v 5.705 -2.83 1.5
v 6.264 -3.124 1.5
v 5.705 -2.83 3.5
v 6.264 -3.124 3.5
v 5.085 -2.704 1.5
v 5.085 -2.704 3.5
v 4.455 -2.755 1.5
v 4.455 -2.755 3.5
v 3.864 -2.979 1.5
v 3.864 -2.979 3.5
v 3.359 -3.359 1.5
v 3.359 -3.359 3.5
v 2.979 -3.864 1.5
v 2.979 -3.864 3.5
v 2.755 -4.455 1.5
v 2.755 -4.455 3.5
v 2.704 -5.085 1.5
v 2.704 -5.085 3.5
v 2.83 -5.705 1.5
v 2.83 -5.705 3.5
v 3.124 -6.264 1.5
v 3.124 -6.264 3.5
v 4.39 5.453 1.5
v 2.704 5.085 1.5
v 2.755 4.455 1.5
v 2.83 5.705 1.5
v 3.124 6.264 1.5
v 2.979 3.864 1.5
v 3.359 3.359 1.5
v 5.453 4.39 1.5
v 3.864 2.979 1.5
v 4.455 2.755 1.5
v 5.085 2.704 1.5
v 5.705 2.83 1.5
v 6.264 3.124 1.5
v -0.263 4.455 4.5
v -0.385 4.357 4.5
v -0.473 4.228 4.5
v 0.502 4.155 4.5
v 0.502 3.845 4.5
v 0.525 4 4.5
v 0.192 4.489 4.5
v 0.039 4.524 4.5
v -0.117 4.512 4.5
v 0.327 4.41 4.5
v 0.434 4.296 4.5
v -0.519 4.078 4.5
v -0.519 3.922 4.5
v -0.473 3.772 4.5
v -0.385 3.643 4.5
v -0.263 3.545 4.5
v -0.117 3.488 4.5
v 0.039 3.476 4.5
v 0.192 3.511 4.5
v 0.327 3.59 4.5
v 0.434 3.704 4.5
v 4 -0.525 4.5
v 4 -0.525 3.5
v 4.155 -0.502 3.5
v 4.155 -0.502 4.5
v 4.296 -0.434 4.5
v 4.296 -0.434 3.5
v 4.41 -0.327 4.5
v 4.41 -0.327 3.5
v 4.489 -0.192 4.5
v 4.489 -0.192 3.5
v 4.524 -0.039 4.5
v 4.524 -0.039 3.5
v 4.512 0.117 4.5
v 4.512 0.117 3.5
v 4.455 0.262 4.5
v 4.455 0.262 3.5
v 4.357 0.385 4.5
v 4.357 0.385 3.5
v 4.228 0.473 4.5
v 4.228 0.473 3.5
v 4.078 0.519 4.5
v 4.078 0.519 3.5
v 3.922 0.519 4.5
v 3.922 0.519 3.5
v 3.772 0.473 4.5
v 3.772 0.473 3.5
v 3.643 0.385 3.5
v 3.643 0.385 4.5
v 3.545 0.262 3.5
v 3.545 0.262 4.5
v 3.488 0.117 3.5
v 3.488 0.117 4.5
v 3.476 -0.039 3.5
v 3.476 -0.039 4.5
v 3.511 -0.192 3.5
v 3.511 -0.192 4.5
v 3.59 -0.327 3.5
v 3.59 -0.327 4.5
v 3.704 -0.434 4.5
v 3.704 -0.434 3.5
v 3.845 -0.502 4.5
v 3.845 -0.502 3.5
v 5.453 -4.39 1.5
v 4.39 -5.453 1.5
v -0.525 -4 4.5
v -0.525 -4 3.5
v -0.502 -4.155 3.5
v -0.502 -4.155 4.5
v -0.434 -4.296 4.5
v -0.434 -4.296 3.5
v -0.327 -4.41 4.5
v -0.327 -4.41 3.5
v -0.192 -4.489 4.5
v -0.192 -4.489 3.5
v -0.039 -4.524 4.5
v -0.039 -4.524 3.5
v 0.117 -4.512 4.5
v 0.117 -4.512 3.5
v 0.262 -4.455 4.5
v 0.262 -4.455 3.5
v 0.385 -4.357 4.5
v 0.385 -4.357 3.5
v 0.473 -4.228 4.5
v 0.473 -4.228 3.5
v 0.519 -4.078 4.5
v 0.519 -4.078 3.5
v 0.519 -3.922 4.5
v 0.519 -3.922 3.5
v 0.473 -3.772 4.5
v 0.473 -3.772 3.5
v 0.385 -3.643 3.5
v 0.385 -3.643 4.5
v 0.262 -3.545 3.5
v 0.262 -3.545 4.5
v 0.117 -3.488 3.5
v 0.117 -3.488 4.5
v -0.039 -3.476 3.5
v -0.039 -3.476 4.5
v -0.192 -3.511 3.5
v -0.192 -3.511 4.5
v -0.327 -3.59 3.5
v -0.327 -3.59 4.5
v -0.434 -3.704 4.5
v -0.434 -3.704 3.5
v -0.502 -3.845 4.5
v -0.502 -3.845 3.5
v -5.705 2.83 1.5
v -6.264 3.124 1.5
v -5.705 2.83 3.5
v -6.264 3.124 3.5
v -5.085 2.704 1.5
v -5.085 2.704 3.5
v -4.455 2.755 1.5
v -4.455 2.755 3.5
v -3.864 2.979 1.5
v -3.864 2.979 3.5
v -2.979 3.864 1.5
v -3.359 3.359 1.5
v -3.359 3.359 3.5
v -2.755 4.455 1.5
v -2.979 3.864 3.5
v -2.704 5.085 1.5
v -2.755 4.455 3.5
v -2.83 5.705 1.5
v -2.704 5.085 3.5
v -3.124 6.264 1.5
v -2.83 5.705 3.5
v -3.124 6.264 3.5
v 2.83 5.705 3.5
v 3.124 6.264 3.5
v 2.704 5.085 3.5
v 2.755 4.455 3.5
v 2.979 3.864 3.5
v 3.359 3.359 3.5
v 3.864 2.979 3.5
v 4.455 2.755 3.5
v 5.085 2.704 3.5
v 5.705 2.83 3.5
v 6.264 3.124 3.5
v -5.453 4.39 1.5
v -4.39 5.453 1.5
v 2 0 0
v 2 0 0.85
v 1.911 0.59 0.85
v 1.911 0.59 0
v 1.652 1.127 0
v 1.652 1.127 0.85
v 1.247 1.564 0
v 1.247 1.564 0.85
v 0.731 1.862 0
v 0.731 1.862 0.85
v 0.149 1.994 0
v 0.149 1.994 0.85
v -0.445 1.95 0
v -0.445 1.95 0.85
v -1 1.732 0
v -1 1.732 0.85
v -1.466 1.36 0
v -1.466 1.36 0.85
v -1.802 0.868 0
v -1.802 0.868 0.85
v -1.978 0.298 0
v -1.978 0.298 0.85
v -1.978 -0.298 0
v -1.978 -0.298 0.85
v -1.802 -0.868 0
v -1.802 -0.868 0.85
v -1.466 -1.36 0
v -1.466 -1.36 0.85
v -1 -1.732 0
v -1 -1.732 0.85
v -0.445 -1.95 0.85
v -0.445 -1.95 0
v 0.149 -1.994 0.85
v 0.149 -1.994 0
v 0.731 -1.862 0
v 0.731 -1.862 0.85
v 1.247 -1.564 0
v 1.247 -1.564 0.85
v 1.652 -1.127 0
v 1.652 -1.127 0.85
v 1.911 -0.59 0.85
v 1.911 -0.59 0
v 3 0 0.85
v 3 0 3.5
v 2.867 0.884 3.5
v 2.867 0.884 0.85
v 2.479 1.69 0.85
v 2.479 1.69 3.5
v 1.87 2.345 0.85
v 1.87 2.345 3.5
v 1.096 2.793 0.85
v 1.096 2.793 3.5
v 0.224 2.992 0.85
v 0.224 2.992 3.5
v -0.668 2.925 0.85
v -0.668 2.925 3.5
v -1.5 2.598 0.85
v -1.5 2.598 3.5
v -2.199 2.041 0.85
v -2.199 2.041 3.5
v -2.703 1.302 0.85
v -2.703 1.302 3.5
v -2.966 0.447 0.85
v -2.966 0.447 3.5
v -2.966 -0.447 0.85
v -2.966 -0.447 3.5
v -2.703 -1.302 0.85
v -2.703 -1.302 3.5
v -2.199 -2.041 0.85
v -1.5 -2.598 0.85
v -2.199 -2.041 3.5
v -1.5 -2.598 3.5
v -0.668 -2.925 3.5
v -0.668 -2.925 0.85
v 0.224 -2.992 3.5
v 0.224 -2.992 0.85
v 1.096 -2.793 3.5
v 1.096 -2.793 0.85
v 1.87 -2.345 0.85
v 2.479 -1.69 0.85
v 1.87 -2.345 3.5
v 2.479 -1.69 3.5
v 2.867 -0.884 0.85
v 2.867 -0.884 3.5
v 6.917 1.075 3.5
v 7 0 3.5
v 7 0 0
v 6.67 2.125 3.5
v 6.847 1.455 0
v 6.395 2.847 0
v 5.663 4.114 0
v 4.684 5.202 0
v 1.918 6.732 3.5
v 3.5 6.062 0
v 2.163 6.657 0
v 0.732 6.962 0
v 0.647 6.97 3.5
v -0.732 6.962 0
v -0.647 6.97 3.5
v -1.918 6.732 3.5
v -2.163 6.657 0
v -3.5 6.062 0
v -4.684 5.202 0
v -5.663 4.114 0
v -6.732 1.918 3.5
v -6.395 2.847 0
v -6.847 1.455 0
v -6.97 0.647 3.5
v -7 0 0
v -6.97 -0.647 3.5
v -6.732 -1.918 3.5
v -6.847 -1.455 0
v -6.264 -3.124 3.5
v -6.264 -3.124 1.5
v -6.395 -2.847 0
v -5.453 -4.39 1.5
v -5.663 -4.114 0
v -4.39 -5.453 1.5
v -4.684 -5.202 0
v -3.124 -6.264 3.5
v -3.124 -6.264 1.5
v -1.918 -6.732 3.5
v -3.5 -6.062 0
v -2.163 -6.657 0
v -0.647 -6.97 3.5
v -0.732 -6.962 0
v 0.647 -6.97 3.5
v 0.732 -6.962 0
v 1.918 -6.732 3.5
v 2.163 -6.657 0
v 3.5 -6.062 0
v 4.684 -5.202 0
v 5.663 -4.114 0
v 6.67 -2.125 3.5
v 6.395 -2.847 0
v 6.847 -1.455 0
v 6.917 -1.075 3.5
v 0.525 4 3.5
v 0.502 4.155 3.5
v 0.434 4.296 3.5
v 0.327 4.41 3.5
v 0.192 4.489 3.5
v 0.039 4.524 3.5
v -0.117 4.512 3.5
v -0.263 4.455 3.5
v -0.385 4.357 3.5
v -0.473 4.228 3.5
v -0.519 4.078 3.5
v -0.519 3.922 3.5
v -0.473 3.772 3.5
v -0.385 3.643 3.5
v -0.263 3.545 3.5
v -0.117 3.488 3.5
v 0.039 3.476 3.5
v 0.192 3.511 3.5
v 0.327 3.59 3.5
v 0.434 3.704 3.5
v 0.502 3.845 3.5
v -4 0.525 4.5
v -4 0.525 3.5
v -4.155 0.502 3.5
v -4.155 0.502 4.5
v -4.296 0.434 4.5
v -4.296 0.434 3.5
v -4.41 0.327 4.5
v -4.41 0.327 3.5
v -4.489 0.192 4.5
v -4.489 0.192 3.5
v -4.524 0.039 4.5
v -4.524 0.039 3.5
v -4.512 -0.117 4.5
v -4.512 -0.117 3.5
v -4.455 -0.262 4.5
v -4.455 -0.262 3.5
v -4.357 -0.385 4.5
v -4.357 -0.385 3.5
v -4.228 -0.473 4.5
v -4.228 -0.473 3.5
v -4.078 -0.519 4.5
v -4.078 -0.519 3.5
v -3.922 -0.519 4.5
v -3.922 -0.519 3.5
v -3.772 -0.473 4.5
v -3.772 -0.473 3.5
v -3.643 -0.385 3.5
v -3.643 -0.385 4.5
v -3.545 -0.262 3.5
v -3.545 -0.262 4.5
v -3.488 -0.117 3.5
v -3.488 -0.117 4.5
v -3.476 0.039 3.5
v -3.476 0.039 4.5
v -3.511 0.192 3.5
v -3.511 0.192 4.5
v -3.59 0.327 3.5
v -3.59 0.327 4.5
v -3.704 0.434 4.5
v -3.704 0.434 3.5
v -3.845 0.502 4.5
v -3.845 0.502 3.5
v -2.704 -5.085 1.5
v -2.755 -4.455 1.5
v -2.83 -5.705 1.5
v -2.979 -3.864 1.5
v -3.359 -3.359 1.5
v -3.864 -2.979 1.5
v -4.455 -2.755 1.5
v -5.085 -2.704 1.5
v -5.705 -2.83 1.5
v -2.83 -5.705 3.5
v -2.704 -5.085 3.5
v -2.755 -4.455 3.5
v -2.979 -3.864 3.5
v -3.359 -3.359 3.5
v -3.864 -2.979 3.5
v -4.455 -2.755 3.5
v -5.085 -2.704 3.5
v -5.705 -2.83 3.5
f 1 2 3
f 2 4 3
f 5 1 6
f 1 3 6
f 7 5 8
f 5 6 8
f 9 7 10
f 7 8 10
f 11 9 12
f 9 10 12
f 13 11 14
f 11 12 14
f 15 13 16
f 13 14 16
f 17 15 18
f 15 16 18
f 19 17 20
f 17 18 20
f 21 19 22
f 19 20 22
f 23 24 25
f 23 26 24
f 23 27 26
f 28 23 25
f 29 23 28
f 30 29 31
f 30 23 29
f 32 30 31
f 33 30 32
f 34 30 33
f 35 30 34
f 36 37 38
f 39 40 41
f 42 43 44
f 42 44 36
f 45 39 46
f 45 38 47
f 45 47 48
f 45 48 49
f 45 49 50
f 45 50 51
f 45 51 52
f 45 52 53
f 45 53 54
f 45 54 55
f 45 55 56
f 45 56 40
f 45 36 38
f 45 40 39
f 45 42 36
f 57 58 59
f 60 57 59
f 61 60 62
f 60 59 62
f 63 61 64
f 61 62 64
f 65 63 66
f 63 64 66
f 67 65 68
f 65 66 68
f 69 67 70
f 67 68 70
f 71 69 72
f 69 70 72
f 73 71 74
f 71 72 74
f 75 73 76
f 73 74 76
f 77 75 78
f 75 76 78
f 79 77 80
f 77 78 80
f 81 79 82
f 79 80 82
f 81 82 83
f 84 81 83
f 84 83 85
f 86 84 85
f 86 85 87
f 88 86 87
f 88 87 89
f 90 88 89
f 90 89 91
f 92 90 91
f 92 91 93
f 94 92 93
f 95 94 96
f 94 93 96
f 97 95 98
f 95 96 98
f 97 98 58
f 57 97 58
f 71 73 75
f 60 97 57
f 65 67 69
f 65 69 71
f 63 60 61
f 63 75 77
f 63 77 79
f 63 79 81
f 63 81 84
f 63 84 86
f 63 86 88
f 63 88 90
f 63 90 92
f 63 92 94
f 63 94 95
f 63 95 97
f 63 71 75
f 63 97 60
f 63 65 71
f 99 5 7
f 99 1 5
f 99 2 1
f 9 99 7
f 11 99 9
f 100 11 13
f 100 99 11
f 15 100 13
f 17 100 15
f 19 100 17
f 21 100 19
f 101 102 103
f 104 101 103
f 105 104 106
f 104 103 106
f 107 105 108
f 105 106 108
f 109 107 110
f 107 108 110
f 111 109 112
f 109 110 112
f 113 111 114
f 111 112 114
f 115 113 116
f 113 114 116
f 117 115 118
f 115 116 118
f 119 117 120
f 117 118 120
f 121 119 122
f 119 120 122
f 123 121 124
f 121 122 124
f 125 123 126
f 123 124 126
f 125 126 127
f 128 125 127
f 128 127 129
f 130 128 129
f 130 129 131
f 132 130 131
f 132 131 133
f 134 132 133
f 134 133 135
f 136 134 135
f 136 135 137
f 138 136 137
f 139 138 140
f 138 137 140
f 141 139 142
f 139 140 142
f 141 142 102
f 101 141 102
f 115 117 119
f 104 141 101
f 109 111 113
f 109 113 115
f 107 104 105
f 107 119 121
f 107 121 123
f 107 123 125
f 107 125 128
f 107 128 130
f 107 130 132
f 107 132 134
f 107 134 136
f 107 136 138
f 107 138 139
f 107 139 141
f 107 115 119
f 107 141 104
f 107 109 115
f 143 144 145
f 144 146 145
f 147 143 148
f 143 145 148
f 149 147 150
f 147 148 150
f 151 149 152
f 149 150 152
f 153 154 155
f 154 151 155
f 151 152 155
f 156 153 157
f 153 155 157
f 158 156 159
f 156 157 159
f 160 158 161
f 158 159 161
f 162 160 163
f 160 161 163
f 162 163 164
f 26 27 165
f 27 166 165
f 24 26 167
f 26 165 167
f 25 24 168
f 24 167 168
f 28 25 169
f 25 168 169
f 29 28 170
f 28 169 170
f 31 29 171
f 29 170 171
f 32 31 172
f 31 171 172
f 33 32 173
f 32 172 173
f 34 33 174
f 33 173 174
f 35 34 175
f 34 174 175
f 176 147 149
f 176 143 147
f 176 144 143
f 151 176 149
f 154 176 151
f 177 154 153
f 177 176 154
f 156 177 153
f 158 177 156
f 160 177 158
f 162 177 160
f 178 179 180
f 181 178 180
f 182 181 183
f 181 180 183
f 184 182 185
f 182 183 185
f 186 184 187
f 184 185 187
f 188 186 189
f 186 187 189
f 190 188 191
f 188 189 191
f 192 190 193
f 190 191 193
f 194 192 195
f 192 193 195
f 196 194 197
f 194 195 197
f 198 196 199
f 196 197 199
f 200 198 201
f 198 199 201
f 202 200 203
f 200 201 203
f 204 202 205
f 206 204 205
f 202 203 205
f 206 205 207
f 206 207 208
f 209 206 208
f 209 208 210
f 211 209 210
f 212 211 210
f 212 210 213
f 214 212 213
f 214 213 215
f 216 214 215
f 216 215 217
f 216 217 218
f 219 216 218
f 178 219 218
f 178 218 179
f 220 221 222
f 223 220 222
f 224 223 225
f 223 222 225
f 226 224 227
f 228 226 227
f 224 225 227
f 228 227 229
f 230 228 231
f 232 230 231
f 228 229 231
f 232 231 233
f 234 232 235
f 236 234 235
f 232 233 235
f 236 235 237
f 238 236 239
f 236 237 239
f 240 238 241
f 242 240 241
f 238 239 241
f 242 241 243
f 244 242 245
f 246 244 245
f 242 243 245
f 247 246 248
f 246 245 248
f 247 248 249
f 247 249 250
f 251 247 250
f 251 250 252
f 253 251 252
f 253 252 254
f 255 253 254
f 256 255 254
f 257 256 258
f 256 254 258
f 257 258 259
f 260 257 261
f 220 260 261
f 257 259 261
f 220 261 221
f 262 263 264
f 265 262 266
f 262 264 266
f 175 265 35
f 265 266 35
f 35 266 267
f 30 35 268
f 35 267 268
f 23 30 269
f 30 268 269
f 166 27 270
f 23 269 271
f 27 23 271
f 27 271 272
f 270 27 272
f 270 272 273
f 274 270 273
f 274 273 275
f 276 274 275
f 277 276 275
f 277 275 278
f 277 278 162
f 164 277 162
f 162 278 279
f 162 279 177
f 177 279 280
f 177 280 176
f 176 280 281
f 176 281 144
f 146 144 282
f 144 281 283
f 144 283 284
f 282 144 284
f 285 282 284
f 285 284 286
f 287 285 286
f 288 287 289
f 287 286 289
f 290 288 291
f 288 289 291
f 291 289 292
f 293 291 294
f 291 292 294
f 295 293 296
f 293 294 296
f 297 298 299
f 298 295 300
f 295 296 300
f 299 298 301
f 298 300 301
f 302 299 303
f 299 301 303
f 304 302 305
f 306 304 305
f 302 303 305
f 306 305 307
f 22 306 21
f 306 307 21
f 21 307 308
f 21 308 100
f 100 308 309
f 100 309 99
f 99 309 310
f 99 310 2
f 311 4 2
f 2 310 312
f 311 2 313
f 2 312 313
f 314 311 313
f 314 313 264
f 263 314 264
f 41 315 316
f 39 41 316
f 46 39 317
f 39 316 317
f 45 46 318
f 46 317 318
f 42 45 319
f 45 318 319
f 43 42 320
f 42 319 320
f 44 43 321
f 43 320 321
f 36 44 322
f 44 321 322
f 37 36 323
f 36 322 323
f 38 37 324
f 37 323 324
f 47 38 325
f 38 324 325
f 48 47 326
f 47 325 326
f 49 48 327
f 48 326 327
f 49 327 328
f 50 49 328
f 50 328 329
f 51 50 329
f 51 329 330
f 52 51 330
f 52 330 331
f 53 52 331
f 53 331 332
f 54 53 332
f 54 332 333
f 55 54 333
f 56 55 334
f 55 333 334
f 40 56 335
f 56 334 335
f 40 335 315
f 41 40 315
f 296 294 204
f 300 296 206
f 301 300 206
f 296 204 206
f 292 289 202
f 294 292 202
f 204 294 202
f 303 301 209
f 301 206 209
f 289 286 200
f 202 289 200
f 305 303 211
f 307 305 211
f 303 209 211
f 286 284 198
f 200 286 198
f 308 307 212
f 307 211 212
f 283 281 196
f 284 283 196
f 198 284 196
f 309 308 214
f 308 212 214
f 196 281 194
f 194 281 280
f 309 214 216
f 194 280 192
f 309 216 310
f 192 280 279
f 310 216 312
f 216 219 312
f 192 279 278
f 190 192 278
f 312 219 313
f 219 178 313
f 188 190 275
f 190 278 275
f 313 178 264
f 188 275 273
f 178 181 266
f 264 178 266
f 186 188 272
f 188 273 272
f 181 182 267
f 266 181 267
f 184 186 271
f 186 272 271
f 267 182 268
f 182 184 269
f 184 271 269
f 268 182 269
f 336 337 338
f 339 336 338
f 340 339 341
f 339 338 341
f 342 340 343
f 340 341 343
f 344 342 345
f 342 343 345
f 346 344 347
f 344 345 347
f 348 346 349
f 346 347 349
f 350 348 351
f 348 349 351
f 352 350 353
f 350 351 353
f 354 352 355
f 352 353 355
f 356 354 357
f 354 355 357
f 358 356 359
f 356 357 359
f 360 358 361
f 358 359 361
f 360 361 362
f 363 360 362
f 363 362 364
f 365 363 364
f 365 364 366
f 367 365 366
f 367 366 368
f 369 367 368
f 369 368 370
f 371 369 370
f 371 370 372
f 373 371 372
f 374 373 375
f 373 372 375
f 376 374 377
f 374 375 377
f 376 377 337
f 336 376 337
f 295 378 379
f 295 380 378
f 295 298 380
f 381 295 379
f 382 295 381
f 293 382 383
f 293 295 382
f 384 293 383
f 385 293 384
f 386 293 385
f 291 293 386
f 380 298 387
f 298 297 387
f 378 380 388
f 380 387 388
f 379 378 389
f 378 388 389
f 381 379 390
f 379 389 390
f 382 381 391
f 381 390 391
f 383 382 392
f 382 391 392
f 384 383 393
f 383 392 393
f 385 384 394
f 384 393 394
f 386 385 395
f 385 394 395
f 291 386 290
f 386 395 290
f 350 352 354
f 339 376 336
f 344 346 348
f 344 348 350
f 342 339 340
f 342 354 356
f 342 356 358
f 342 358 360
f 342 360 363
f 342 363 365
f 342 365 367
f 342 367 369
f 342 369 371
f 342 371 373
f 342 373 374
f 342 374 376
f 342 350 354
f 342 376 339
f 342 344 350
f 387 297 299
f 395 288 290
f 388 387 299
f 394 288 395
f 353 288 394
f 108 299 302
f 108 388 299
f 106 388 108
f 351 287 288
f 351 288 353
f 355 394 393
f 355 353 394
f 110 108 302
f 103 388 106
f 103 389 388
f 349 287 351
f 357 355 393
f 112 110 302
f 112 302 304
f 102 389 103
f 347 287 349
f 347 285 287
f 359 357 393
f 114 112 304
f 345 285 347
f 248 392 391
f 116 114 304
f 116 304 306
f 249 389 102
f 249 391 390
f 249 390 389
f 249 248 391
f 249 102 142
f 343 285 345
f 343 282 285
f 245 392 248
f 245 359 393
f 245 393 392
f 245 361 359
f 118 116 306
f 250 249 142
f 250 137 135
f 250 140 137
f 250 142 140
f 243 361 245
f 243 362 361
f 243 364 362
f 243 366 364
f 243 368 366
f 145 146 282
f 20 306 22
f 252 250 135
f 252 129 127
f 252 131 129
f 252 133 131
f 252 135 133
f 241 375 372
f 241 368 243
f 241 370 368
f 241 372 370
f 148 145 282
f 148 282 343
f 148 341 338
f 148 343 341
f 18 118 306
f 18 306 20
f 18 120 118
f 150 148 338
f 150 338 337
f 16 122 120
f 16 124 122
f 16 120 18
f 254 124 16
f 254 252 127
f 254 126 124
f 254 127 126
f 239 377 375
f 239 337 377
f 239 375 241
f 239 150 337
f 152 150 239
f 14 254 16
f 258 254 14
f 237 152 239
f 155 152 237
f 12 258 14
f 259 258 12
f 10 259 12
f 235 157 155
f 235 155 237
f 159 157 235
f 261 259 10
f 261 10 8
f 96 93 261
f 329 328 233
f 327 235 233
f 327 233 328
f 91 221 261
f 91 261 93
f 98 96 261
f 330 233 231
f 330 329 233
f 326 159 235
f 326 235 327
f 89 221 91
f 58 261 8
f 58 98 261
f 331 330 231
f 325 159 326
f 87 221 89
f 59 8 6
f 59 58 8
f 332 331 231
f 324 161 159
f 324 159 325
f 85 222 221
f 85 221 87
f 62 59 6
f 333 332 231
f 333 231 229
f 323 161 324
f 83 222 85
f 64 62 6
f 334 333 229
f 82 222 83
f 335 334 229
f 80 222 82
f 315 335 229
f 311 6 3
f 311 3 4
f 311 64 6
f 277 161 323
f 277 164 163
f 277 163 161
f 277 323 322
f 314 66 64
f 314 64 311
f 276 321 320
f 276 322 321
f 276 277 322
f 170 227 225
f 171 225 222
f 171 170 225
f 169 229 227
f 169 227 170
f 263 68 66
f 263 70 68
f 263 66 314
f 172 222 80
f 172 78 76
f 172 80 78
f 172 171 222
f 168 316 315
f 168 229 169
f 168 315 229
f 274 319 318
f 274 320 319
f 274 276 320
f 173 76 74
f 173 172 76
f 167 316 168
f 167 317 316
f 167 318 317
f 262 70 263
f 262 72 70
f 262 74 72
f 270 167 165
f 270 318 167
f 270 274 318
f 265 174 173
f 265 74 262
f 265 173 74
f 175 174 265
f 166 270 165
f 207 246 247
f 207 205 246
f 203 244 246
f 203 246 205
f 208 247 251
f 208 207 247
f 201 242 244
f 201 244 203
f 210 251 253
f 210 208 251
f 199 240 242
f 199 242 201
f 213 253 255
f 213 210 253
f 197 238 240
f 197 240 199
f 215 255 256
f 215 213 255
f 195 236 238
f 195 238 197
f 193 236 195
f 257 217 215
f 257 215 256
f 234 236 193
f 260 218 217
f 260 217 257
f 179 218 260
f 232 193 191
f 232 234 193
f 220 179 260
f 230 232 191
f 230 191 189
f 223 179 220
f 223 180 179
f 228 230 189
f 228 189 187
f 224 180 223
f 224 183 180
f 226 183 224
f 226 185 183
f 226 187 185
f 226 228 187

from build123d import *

# Parameters (mm, degrees)
SKIZZE1_R                            = 7
AUFSATZ_LINEAR_AUSTRAGEN1_DEPTH      = 3.5
SKIZZE2_R                            = 0.525
AUFSATZ_LINEAR_AUSTRAGEN2_DEPTH      = 1
KREISMUSTER1_COUNT                   = 4
SKIZZE3_R                            = 3
SCHNITT_LINEAR_AUSTRAGEN1_DEPTH      = 2
SCHNITT_LINEAR_AUSTRAGEN1_DEPTH_BACK = 2.65
SKIZZE4_R                            = 2
SCHNITT_LINEAR_AUSTRAGEN2_DEPTH      = 1.85
SKIZZE5_R                            = 2.25
SCHNITT_LINEAR_AUSTRAGEN3_DEPTH      = 2
KREISMUSTER2_COUNT                   = 4


with BuildPart() as part:
    # Skizze1 → Aufsatz-Linear austragen1 (new body)
    with BuildSketch(Plane.XY):
        Circle(SKIZZE1_R)
    extrude(amount=AUFSATZ_LINEAR_AUSTRAGEN1_DEPTH)

    # Skizze2 → Aufsatz-Linear austragen2 (add)
    with BuildSketch(Plane.XY.offset(3.5)):
        with Locations((0, 4)):
            Circle(SKIZZE2_R)
    aufsatz_linear_austragen2 = extrude(amount=AUFSATZ_LINEAR_AUSTRAGEN2_DEPTH)

    # Kreismuster1: Aufsatz-Linear austragen2 ×4 about axis
    kreismuster1_axis = Axis((0, 0, 0), (0, 0, 1))
    for i in range(1, KREISMUSTER1_COUNT):
        add(aufsatz_linear_austragen2.rotate(kreismuster1_axis, i * 360 / KREISMUSTER1_COUNT))

    # Skizze3 → Schnitt-Linear austragen1 (cut, two sides)
    with BuildSketch(Plane.XY.offset(3.5)) as schnitt_linear_austragen1_sk:
        Circle(SKIZZE3_R)
    extrude(amount=SCHNITT_LINEAR_AUSTRAGEN1_DEPTH, mode=Mode.SUBTRACT)
    extrude(schnitt_linear_austragen1_sk.sketch, amount=-SCHNITT_LINEAR_AUSTRAGEN1_DEPTH_BACK, mode=Mode.SUBTRACT)

    # Skizze4 → Schnitt-Linear austragen2 (cut, through all)
    with BuildSketch(Plane.XY.offset(0.85)):
        Circle(SKIZZE4_R)
    extrude(amount=-SCHNITT_LINEAR_AUSTRAGEN2_DEPTH, mode=Mode.SUBTRACT)

    # Skizze5 → Schnitt-Linear austragen3 (cut)
    with BuildSketch(Plane.XY.offset(3.5)):
        with Locations((-4.949747468, 4.949747468)):
            Circle(SKIZZE5_R)
    schnitt_linear_austragen3 = extrude(amount=-SCHNITT_LINEAR_AUSTRAGEN3_DEPTH, mode=Mode.SUBTRACT)

    # Kreismuster2: Schnitt-Linear austragen3 ×4 about axis
    kreismuster2_axis = Axis((0, 0, 0), (0, 0, 1))
    for i in range(1, KREISMUSTER2_COUNT):
        add(schnitt_linear_austragen3.rotate(kreismuster2_axis, i * 360 / KREISMUSTER2_COUNT), mode=Mode.SUBTRACT)


solid = part.part
